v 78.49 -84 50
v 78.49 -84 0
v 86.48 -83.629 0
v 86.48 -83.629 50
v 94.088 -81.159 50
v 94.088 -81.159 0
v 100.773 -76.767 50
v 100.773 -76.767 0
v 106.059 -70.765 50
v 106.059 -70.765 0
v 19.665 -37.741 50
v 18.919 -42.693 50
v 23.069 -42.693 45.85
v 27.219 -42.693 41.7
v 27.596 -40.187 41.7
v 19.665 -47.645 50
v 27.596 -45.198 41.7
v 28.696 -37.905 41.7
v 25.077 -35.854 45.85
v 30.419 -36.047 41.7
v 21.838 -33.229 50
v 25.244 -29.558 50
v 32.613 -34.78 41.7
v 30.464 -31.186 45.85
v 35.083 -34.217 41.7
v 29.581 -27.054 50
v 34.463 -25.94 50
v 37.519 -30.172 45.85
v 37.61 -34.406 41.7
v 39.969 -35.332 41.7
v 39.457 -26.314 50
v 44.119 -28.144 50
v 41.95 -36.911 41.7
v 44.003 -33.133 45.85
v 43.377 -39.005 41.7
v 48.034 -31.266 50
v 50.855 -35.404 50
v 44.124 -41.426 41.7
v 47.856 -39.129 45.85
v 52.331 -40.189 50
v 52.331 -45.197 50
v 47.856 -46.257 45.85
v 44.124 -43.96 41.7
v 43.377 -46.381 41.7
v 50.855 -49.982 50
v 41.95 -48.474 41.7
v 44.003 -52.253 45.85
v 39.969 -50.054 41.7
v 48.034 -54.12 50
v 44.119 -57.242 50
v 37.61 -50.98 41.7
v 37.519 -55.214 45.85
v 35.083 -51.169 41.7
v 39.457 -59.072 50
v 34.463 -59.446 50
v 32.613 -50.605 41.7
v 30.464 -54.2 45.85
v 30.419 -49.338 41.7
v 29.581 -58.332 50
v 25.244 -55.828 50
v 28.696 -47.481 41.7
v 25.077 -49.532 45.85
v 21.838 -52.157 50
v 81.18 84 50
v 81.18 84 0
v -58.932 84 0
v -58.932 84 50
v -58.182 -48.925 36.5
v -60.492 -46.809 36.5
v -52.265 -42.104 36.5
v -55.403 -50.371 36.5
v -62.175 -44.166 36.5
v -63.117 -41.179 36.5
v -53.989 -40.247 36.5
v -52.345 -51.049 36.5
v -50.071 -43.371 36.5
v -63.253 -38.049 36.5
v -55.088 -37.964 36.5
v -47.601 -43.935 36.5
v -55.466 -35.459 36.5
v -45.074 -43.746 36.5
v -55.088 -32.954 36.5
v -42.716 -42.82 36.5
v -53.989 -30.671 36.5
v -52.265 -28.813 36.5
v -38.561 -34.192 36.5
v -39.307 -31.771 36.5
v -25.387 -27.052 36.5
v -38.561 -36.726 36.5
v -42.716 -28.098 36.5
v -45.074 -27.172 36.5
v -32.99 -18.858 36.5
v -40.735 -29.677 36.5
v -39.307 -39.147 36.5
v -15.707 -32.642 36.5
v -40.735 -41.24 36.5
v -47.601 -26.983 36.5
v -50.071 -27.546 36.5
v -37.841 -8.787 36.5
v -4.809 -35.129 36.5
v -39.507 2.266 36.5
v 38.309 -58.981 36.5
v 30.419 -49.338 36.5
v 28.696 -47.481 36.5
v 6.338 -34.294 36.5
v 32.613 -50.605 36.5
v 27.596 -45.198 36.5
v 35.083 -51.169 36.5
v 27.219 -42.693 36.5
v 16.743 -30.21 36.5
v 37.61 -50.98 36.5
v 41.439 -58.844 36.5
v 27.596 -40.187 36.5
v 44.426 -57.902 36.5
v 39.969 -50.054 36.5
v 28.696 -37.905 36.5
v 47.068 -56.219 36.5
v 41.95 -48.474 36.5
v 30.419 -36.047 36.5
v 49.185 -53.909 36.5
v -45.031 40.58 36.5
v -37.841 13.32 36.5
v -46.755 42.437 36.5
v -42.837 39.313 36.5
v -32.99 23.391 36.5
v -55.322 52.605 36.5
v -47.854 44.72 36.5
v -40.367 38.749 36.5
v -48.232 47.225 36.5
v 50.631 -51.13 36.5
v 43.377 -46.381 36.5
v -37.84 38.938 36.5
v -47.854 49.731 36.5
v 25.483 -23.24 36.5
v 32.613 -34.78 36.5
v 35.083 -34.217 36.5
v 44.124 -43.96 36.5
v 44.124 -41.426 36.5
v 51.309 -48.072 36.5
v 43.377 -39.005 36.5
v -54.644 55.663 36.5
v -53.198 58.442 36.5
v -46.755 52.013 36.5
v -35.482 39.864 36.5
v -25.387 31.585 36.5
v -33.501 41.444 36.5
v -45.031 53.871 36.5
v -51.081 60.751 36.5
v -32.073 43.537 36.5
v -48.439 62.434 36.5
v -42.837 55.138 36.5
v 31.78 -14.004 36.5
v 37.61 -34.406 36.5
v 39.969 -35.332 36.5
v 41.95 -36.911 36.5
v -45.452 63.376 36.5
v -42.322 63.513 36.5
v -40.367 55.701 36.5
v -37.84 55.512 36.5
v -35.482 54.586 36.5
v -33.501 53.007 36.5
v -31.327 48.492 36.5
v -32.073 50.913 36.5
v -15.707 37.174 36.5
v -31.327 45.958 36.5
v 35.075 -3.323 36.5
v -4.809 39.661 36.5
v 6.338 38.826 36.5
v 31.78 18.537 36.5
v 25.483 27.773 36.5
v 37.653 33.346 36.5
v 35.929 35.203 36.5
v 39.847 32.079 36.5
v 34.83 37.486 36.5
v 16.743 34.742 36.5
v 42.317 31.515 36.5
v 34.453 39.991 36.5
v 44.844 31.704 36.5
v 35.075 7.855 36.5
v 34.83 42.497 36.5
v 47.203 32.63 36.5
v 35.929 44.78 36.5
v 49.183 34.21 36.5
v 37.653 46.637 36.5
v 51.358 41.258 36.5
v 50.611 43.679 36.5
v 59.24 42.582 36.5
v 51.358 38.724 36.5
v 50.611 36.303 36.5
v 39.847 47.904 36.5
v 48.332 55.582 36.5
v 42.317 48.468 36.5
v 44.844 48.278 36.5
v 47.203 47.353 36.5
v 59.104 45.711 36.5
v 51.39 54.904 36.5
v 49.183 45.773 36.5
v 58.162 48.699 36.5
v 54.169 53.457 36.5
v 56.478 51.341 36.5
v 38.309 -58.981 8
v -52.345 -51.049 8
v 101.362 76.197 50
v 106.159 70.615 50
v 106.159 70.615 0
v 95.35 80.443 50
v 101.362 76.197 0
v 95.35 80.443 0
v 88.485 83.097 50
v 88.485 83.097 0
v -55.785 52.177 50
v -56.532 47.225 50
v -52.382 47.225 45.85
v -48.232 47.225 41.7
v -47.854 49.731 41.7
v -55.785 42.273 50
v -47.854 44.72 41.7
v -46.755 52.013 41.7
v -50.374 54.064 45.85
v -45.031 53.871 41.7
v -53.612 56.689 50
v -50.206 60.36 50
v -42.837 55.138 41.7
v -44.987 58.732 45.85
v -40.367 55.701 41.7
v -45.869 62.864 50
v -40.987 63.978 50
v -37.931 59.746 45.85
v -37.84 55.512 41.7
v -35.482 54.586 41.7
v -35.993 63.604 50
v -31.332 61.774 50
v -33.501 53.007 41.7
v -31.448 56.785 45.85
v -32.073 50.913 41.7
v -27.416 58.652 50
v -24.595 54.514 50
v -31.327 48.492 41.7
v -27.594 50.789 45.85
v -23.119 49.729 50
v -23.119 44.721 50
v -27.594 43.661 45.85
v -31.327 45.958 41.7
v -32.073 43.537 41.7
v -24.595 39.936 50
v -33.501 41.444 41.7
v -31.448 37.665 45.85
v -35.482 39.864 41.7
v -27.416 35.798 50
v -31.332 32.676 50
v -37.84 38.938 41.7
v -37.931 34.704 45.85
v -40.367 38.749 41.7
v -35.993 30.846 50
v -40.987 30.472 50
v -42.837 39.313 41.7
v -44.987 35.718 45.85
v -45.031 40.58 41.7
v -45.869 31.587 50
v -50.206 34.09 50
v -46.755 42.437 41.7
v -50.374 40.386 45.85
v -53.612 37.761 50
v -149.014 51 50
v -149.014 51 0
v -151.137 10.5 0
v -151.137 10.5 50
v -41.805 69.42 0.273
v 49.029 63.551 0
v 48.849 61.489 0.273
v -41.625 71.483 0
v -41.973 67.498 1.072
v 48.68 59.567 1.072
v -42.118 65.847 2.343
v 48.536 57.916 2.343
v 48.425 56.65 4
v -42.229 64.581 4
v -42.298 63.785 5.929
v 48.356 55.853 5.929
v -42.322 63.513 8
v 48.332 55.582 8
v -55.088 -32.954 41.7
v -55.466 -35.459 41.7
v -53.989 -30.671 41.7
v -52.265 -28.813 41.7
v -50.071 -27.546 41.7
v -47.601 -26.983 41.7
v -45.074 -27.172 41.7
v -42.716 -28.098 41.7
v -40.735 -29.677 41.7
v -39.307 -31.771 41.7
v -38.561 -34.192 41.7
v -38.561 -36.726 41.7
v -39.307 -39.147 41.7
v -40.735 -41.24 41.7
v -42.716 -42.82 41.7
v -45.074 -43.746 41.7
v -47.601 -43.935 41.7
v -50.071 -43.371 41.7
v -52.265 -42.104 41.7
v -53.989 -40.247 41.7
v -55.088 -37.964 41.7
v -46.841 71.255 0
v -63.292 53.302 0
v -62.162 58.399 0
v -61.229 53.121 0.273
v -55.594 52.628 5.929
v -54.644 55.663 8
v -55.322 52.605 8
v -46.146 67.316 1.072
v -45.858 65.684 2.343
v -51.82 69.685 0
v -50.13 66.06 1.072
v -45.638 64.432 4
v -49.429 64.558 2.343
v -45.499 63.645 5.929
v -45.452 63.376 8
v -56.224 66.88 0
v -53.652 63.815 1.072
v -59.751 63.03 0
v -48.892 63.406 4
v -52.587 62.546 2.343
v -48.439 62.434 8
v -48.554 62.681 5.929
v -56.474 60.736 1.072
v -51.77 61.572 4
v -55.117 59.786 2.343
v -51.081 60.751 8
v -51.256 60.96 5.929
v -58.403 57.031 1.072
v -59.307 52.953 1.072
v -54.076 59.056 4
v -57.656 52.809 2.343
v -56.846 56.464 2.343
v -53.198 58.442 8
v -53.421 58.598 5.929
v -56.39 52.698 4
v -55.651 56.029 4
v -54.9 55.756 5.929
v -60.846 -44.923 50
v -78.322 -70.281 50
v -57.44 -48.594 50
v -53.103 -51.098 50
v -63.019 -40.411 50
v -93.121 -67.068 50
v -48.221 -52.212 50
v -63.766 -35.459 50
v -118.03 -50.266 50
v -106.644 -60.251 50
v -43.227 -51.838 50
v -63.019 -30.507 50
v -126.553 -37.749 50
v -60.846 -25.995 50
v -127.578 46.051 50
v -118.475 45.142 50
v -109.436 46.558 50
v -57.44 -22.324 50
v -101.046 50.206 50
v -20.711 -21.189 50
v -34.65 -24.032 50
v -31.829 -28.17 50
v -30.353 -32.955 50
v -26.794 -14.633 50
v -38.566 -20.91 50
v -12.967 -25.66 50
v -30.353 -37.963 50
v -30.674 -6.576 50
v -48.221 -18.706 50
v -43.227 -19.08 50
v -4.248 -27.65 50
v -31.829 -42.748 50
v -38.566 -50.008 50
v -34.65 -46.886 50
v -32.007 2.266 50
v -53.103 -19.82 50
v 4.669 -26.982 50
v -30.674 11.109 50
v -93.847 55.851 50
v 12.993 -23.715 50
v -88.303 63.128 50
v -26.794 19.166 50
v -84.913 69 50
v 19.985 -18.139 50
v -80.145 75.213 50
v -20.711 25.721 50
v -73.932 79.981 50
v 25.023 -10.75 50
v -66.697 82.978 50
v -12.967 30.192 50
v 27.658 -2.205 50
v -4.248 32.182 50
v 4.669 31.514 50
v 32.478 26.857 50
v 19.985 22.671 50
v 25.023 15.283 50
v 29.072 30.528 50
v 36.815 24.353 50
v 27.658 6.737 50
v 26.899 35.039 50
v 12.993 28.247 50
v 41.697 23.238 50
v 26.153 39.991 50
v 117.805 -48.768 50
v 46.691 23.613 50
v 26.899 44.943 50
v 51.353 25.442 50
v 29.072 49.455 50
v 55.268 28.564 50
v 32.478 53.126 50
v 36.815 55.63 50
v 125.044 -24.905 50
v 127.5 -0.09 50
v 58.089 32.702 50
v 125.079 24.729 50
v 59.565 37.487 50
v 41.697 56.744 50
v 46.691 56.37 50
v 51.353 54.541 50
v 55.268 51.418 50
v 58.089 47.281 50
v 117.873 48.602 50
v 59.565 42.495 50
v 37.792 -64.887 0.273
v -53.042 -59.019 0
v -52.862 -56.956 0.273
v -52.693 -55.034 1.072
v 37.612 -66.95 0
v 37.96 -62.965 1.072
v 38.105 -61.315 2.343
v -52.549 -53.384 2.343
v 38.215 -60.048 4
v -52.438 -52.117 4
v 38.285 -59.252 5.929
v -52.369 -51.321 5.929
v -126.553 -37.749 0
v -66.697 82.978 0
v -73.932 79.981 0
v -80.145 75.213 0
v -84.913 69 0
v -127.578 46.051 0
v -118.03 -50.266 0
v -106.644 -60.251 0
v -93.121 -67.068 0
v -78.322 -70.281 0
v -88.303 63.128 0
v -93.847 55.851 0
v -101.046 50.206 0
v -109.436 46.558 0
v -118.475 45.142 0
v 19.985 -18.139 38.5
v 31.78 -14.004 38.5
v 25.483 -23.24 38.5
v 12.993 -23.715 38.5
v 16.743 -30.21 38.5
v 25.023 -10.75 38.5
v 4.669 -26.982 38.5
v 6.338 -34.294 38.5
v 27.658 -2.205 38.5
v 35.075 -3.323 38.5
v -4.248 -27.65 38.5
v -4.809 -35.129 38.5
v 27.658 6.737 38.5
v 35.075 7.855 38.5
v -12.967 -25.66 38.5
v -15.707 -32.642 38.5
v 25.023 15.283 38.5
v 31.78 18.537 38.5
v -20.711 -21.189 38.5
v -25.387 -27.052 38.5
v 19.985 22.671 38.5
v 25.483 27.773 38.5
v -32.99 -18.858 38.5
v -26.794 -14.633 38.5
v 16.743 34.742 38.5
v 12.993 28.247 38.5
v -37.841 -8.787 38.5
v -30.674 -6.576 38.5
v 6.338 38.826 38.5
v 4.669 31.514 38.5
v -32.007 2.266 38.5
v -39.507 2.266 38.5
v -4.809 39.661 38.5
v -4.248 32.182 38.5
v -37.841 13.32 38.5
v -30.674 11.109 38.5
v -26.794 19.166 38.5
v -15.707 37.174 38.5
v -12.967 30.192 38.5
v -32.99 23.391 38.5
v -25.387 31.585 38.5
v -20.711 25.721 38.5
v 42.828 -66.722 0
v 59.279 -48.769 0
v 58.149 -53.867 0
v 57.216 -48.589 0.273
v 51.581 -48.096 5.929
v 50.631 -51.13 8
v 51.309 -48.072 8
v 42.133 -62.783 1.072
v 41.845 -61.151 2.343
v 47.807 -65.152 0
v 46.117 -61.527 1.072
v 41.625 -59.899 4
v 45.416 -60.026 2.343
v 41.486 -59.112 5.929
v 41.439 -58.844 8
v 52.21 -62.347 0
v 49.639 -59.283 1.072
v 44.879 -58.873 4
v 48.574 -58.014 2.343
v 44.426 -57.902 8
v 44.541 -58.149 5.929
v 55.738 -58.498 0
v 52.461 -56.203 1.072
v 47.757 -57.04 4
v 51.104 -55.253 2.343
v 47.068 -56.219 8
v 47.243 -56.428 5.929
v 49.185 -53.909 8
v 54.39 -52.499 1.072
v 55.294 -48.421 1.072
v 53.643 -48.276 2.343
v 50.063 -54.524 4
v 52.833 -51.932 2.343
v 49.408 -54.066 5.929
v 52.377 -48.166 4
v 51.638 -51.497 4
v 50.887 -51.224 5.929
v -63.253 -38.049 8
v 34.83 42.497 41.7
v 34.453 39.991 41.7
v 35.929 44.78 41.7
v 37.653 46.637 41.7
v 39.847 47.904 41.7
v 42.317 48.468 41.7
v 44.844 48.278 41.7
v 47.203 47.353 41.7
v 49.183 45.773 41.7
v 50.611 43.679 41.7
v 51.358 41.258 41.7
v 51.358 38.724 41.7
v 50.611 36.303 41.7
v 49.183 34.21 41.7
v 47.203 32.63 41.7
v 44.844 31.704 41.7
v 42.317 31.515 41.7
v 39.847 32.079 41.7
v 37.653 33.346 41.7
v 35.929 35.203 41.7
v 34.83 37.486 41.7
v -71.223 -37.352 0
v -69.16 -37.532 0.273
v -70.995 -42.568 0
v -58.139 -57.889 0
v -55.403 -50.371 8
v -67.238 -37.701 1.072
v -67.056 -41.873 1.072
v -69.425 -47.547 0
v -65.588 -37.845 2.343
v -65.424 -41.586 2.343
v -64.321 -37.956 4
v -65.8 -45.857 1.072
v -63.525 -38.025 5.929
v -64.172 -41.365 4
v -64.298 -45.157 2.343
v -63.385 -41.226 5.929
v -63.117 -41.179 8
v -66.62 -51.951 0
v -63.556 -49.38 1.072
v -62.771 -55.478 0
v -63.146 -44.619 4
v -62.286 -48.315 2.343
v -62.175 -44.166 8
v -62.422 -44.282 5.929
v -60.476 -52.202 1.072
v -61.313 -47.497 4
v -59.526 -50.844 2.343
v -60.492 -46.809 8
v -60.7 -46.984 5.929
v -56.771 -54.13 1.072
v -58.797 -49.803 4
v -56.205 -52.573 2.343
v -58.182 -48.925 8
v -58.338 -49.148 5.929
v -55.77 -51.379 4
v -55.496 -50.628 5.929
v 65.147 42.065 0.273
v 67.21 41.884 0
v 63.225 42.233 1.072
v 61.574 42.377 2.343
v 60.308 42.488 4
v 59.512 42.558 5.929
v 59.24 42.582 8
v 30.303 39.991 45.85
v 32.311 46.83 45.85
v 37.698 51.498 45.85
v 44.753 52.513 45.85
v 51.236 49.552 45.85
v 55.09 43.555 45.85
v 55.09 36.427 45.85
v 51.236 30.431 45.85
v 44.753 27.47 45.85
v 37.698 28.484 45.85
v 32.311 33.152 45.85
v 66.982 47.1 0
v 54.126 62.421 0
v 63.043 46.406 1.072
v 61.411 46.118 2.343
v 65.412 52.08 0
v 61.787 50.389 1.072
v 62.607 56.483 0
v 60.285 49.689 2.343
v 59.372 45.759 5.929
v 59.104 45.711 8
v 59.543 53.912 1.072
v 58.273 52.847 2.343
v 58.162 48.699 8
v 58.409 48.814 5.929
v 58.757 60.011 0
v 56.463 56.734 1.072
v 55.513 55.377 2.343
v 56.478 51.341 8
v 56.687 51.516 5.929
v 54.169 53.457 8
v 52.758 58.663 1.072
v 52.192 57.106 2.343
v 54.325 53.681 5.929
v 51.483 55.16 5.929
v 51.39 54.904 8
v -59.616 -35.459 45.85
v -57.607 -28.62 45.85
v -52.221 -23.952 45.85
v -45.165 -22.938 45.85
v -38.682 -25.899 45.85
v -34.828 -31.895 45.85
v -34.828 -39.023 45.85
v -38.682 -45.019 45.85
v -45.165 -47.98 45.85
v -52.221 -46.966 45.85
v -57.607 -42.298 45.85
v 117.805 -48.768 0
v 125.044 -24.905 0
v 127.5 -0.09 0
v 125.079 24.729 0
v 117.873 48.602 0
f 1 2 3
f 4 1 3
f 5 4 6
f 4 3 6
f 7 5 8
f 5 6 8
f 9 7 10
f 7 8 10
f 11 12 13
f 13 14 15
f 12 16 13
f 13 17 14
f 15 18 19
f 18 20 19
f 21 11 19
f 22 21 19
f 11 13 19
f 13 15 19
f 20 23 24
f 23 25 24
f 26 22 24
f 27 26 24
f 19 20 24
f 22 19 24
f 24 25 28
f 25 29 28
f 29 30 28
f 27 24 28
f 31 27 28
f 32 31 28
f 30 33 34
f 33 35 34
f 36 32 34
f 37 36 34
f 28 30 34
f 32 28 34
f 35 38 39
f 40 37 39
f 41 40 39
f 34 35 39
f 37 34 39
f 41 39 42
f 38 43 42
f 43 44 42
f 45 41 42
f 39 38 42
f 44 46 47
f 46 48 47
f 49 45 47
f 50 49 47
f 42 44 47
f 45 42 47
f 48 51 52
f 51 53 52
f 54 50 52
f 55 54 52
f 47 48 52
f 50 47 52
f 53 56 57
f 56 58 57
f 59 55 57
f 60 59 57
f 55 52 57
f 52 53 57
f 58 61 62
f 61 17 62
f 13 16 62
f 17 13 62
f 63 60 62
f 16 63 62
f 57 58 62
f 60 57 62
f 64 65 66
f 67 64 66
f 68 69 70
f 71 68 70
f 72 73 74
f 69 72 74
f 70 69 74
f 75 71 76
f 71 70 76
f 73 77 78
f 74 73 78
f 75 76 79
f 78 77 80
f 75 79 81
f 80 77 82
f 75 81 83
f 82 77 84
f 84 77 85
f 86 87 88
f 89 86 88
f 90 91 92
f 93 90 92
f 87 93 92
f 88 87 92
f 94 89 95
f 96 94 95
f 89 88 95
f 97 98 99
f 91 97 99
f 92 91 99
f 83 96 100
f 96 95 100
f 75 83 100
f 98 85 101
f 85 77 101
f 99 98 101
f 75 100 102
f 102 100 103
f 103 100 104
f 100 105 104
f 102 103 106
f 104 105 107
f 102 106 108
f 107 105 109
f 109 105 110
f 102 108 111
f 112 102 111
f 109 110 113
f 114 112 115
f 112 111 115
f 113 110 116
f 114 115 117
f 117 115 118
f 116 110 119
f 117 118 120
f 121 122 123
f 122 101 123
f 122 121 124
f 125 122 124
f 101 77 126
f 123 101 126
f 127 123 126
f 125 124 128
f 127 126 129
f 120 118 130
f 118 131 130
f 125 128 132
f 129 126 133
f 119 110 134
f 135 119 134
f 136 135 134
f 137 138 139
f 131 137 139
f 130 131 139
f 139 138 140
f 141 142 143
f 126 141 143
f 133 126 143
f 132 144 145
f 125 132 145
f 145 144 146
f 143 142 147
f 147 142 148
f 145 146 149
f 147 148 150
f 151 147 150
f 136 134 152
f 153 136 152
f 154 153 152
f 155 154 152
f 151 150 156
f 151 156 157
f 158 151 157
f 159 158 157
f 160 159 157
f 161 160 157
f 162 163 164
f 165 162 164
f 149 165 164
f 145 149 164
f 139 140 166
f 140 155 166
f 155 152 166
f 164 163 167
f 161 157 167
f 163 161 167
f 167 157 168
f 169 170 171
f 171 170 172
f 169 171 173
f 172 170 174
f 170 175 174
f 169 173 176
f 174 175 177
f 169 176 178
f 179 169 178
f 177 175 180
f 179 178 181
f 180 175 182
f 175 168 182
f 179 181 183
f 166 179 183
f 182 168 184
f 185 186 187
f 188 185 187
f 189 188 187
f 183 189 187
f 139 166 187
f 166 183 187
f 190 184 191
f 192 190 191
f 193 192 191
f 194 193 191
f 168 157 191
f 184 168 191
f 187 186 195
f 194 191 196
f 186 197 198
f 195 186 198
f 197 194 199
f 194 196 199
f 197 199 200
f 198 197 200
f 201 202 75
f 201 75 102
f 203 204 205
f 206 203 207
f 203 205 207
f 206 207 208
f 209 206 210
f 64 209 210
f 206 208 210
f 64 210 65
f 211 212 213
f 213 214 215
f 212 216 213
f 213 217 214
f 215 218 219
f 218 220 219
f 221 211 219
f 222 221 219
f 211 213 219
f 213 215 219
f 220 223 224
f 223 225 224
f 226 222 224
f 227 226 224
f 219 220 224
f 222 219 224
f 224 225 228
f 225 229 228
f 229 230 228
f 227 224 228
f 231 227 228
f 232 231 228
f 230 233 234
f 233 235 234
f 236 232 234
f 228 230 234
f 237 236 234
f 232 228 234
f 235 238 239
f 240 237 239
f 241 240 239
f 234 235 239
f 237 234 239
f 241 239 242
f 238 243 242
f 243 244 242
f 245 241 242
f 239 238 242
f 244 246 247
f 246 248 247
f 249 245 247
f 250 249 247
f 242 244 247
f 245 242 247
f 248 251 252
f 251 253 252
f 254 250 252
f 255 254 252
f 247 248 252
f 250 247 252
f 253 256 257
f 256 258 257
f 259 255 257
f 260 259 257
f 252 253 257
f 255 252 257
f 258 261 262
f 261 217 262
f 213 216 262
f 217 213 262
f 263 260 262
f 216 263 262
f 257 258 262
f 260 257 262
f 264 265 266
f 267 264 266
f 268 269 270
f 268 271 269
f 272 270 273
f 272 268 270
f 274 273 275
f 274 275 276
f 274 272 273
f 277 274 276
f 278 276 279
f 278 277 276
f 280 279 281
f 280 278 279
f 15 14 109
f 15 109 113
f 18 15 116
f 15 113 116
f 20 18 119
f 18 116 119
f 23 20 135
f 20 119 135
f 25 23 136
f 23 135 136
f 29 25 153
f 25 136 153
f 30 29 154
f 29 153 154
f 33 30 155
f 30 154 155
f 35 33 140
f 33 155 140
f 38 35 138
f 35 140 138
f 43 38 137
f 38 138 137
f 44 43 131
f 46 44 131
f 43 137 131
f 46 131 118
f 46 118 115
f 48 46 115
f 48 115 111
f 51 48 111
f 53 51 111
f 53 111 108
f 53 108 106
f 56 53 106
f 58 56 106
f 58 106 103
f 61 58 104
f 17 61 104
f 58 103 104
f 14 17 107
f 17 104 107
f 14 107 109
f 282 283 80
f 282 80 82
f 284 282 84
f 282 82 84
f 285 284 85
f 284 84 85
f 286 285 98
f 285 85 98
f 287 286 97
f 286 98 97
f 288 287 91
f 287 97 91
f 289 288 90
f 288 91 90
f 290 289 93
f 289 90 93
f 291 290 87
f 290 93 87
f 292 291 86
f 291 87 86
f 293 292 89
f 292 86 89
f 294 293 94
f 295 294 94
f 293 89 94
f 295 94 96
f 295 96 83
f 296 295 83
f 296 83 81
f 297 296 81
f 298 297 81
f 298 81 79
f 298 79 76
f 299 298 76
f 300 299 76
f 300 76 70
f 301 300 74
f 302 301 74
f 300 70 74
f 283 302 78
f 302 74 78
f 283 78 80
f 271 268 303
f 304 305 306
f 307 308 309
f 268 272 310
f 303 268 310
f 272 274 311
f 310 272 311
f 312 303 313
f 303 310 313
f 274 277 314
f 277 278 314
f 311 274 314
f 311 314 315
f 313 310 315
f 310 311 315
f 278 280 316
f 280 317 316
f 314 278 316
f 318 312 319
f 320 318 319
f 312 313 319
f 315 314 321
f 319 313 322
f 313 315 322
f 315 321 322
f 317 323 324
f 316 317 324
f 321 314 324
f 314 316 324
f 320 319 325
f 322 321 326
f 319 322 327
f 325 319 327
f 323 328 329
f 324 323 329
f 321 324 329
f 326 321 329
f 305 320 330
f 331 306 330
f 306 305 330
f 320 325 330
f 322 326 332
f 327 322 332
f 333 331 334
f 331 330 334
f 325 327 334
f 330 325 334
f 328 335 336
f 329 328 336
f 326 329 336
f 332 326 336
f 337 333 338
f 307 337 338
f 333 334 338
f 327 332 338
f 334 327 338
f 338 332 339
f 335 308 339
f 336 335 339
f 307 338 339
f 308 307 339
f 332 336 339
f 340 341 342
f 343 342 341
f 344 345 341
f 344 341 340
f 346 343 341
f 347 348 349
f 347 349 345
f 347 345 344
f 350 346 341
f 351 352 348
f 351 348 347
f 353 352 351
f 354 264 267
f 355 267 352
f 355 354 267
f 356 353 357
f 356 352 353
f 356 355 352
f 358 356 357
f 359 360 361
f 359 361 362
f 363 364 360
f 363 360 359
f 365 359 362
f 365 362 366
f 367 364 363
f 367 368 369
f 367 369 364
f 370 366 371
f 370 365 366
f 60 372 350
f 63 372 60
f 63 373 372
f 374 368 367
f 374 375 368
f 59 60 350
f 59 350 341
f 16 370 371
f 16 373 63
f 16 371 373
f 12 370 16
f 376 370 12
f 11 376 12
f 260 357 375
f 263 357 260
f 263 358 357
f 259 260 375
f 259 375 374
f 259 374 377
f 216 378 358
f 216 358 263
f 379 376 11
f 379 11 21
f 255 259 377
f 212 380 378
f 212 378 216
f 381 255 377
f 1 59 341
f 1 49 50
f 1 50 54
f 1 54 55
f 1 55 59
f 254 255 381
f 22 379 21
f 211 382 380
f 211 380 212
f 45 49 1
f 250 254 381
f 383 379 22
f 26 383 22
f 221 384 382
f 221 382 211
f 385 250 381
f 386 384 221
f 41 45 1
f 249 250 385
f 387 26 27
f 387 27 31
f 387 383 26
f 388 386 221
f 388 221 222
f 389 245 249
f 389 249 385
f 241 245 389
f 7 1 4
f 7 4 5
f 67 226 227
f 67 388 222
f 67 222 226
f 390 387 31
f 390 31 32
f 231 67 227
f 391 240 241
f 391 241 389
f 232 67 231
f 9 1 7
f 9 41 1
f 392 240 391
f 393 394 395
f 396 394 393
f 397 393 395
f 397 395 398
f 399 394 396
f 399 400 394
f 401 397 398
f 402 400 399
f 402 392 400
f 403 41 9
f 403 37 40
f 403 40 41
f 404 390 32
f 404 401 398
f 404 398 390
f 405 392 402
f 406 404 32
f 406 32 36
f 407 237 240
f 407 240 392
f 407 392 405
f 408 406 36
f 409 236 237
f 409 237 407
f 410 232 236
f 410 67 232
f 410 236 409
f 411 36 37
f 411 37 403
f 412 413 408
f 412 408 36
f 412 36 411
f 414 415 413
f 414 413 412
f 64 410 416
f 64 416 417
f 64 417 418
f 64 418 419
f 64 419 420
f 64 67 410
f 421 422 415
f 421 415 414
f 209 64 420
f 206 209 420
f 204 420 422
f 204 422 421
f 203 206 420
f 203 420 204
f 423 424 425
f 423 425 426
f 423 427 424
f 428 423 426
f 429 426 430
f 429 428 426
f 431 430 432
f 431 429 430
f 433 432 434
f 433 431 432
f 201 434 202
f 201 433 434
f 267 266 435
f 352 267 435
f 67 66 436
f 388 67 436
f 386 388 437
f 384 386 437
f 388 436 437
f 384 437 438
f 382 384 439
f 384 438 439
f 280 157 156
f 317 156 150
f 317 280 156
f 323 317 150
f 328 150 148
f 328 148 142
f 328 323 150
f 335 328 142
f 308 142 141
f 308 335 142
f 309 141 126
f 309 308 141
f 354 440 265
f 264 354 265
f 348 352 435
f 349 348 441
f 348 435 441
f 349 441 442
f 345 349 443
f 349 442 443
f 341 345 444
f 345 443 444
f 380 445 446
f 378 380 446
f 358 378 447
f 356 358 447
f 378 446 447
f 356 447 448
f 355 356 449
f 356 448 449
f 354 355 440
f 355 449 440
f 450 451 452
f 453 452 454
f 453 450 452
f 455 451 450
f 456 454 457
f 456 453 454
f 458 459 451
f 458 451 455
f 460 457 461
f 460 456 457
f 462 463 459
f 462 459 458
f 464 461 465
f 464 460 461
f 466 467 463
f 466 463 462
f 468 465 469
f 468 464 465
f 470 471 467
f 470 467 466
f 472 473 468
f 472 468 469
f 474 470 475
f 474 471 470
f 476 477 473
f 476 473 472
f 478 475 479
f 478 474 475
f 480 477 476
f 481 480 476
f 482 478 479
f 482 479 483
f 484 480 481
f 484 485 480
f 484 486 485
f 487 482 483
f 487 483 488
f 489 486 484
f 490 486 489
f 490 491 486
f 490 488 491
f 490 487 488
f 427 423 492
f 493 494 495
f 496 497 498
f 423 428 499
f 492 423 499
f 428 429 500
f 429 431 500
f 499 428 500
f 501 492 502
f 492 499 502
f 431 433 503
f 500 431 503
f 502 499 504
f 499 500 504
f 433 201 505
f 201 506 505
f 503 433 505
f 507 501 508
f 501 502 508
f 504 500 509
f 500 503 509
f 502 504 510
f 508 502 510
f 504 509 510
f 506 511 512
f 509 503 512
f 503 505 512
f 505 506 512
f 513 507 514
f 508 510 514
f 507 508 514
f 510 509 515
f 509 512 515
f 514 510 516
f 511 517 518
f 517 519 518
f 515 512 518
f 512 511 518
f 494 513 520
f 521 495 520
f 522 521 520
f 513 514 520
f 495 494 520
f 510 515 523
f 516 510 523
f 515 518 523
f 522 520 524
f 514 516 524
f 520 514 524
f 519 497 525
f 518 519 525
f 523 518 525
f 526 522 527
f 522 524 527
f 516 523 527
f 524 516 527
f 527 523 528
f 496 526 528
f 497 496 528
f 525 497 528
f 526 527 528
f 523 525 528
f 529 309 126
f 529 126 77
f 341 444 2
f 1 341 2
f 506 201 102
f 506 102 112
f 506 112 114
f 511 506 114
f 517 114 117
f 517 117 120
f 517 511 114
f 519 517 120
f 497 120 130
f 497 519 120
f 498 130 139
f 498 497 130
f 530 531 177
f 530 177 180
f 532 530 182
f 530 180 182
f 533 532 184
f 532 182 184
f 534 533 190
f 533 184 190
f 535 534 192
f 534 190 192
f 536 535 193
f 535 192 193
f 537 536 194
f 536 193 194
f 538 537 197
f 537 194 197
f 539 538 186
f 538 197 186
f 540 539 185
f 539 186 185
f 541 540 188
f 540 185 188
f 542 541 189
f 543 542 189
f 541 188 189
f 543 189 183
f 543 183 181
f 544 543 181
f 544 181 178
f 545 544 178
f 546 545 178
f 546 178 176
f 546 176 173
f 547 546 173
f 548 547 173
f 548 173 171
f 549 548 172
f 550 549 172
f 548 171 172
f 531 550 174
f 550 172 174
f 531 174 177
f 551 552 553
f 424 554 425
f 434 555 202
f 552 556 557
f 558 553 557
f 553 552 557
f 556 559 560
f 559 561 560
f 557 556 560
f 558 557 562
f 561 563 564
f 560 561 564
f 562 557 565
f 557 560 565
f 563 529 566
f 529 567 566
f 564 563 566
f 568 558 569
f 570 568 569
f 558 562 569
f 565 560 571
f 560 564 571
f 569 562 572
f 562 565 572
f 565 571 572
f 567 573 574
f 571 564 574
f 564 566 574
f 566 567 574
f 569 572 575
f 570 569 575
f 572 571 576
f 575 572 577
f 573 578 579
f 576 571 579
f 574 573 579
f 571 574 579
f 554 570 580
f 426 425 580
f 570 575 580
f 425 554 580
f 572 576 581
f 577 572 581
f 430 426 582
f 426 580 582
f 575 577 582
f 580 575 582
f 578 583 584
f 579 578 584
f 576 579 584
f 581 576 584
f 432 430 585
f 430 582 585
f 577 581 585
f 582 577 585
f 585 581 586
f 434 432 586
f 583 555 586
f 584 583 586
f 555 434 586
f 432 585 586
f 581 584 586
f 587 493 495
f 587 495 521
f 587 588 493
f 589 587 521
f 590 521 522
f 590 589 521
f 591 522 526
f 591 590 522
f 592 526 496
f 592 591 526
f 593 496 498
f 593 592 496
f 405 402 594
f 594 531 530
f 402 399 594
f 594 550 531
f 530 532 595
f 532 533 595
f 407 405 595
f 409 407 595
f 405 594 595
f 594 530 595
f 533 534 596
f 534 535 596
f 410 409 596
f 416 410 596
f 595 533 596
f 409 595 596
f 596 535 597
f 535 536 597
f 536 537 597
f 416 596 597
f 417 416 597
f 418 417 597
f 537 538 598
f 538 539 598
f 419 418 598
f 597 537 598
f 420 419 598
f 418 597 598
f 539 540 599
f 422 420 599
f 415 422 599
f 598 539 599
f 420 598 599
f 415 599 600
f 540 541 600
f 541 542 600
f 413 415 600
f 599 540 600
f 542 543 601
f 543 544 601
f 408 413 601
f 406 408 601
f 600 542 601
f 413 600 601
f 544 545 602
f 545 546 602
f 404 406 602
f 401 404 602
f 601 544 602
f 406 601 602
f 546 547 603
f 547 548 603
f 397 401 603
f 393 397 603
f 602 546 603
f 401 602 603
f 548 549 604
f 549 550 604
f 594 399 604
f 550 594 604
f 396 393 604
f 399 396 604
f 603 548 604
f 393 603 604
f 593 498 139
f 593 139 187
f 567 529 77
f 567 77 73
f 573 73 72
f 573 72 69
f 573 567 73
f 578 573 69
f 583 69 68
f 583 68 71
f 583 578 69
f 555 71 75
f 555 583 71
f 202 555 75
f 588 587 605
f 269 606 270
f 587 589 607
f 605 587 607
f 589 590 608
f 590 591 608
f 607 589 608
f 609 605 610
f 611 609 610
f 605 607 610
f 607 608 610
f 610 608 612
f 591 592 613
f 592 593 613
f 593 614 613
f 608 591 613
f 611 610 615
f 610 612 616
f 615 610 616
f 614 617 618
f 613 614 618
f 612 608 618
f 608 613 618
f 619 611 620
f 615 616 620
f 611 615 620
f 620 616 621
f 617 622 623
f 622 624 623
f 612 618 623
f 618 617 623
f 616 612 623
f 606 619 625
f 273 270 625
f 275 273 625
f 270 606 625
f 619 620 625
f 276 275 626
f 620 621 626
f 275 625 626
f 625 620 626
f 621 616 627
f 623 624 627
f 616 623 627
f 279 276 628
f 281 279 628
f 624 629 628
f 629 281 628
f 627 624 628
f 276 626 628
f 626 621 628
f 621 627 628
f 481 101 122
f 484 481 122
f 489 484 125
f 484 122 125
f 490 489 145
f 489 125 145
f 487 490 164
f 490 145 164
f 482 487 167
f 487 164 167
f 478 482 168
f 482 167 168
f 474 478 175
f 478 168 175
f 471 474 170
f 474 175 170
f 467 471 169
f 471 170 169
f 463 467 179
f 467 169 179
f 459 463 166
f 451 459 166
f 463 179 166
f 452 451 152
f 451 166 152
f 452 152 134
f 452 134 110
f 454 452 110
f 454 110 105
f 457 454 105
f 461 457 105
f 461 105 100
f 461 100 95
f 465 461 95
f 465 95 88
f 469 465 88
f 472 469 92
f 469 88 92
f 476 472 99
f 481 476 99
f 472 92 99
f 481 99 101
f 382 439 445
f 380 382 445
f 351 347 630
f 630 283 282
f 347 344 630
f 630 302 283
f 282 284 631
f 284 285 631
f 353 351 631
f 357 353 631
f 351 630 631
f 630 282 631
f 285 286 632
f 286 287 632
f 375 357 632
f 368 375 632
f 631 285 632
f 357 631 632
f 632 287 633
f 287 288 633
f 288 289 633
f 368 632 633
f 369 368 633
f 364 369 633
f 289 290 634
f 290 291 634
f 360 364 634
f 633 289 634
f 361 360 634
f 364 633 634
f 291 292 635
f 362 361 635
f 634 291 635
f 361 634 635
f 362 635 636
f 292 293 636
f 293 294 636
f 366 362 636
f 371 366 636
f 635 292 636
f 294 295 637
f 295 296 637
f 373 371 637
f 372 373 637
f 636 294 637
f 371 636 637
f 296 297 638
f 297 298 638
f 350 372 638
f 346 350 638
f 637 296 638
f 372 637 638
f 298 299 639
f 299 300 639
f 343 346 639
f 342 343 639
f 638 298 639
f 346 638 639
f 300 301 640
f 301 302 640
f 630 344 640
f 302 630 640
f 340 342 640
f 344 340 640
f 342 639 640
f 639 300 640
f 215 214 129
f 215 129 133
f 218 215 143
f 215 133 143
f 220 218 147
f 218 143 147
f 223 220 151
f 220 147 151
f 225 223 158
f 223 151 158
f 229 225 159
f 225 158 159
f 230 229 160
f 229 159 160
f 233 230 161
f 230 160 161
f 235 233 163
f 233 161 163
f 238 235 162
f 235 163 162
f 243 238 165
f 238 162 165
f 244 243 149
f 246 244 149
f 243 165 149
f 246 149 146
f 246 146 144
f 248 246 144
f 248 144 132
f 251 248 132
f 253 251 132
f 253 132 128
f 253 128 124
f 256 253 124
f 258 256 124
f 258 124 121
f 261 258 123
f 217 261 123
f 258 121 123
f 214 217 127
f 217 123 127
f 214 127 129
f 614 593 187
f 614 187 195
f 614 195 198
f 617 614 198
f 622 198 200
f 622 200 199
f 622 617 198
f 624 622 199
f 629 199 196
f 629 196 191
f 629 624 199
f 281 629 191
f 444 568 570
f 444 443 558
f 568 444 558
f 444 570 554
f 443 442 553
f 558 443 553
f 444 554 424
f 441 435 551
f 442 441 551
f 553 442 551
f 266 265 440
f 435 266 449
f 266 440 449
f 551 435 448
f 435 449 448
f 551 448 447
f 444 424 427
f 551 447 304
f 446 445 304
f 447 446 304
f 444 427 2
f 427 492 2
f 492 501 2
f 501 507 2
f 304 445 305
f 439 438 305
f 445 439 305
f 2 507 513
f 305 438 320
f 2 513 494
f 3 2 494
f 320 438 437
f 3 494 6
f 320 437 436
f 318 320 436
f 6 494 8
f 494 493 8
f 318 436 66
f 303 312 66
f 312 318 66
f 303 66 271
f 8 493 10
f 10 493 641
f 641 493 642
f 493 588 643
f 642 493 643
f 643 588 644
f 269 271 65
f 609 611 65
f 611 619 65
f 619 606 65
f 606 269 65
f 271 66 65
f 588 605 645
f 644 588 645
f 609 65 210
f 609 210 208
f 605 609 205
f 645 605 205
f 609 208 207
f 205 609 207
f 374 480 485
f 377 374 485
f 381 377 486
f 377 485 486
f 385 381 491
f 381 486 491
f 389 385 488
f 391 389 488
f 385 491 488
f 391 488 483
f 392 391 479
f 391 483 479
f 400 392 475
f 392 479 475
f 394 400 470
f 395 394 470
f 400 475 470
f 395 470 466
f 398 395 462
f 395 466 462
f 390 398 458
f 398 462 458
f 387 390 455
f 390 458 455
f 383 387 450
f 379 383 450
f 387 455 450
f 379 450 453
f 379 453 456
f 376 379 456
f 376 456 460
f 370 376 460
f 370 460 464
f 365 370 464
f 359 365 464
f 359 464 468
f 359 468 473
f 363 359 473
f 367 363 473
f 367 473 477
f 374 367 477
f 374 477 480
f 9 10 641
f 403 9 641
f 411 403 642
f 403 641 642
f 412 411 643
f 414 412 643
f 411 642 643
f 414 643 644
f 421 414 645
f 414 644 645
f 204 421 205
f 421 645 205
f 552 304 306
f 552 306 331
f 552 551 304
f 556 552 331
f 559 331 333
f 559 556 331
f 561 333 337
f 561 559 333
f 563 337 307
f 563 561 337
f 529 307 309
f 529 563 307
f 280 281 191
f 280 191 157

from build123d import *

# Parameters (mm, degrees)
EXTRUS_O_PRINCIPAL_DEPTH                            = 50
REBAIXO_CAMISA_DEPTH                                = 36.5
FILETE_ALIVIO_REBAIXO_R                             = 8
ESBO_O2_3_R                                         = 30
FURO_EIXO_DEPTH                                     = 181.048651344
CORTE_EXTRUS_O1_START                               = -36.5
ESBO_O2_4_R                                         = 37.5
CORTE_EXTRUS_O1_DEPTH                               = 2
ESCAREADO_PARA_PARAFUSO_ALLEN_SEXTAVADO_D           = 17
ESCAREADO_PARA_PARAFUSO_ALLEN_SEXTAVADO_CSINK_D     = 33.6
ESCAREADO_PARA_PARAFUSO_ALLEN_SEXTAVADO_CSINK_ANGLE = 90


with BuildPart() as part:
    # Sketch2 → EXTRUSÃO PRINCIPAL (new body)
    with BuildSketch(Plane.XY):
        with BuildLine():
            Line((-127.578119637, 46.051076804), (-149.014261062, 51))
            Line((-149.014261062, 51), (-151.136776123, 10.5))
            Line((-151.136776123, 10.5), (-126.552927997, -37.748518598))
            ThreePointArc((-126.552927997, -37.748518598), (-106.644110754, -60.251342967), (-78.321881111, -70.280770499))
            Line((-78.321881111, -70.280770499), (78.489629635, -84))
            ThreePointArc((78.489629635, -84), (94.087674002, -81.159159507), (106.059471738, -70.764669536))
            ThreePointArc((106.059471738, -70.764669536), (127.499968454, -0.089689786), (106.158925464, 70.615384615))
            ThreePointArc((106.158925464, 70.615384615), (95.349660705, 80.44297202), (81.180354766, 84))
            Line((81.180354766, 84), (-58.932234692, 84))
            ThreePointArc((-58.932234692, 84), (-73.932234692, 79.980762114), (-84.912996806, 69))
            Line((-84.912996806, 69), (-88.302967145, 63.128399137))
            ThreePointArc((-88.302967145, 63.128399137), (-105.1249152, 48.114236459), (-127.578119637, 46.051076804))
        make_face()
    extrude(amount=EXTRUS_O_PRINCIPAL_DEPTH)

    # Esboço2 → REBAIXO CAMISA (cut)
    with BuildSketch(Plane(origin=(0, 0, 0), x_dir=(-1, 0, 0), z_dir=(0, 0, -1))):
        with BuildLine():
            Line((-48.331774145, 55.581801869), (42.321943382, 63.512974459))
            ThreePointArc((42.321943382, 63.512974459), (51.081263611, 60.751171399), (55.322148672, 52.604506995))
            Line((55.322148672, 52.604506995), (63.253321262, -38.049210532))
            ThreePointArc((63.253321262, -38.049210532), (60.491518202, -46.808530761), (52.344853798, -51.049415822))
            Line((52.344853798, -51.049415822), (-38.308863729, -58.980588412))
            ThreePointArc((-38.308863729, -58.980588412), (-47.068183958, -56.218785352), (-51.309069019, -48.072120948))
            Line((-51.309069019, -48.072120948), (-59.240241609, 42.581596579))
            ThreePointArc((-59.240241609, 42.581596579), (-56.478438549, 51.340916808), (-48.331774145, 55.581801869))
        make_face()
    extrude(amount=-REBAIXO_CAMISA_DEPTH, mode=Mode.SUBTRACT)

    # FILETE ALIVIO REBAIXO
    filete_alivio_rebaixo_edges = [part.edges().sort_by_distance(p)[0] for p in [
        (3.004915382, 59.547388164, 0),
        (-51.081263611, 60.751171399, 0),
        (-59.287734967, 7.277648231, 0),
        (56.478438549, 51.340916808, 0),
        (55.274655314, -2.745262185, 0),
        (47.068183958, -56.218785352, 0),
        (-7.017995034, -55.015002117, 0),
        (-60.491518202, -46.808530761, 0),
    ]]
    fillet(filete_alivio_rebaixo_edges, radius=FILETE_ALIVIO_REBAIXO_R)

    # Esboço2<3> → FURO EIXO (cut, through all)
    with BuildSketch(Plane(origin=(0, 0, 0), x_dir=(-1, 0, 0), z_dir=(0, 0, -1))):
        with Locations((2.006539826, 2.266193023)):
            Circle(ESBO_O2_3_R)
    extrude(amount=-FURO_EIXO_DEPTH, mode=Mode.SUBTRACT)

    # Esboço2<4> → Corte-extrusão1 (cut)
    with BuildSketch(Plane(origin=(0, 0, 0), x_dir=(-1, 0, 0), z_dir=(0, 0, -1)).offset(CORTE_EXTRUS_O1_START)):
        with Locations((2.006539826, 2.266193023)):
            Circle(ESBO_O2_4_R)
    extrude(amount=-CORTE_EXTRUS_O1_DEPTH, mode=Mode.SUBTRACT)

    # Escareado para parafuso Allen sextavado escareado de M161 (through all)
    with Locations(Plane.XY.offset(50)):
        with Locations((-39.731656473, 47.225236318), (42.952503468, 39.99130967), (-46.965583121, -35.458923623), (35.71857682, -42.692850271)):
            CounterSinkHole(ESCAREADO_PARA_PARAFUSO_ALLEN_SEXTAVADO_D / 2, ESCAREADO_PARA_PARAFUSO_ALLEN_SEXTAVADO_CSINK_D / 2, counter_sink_angle=ESCAREADO_PARA_PARAFUSO_ALLEN_SEXTAVADO_CSINK_ANGLE)


solid = part.part
